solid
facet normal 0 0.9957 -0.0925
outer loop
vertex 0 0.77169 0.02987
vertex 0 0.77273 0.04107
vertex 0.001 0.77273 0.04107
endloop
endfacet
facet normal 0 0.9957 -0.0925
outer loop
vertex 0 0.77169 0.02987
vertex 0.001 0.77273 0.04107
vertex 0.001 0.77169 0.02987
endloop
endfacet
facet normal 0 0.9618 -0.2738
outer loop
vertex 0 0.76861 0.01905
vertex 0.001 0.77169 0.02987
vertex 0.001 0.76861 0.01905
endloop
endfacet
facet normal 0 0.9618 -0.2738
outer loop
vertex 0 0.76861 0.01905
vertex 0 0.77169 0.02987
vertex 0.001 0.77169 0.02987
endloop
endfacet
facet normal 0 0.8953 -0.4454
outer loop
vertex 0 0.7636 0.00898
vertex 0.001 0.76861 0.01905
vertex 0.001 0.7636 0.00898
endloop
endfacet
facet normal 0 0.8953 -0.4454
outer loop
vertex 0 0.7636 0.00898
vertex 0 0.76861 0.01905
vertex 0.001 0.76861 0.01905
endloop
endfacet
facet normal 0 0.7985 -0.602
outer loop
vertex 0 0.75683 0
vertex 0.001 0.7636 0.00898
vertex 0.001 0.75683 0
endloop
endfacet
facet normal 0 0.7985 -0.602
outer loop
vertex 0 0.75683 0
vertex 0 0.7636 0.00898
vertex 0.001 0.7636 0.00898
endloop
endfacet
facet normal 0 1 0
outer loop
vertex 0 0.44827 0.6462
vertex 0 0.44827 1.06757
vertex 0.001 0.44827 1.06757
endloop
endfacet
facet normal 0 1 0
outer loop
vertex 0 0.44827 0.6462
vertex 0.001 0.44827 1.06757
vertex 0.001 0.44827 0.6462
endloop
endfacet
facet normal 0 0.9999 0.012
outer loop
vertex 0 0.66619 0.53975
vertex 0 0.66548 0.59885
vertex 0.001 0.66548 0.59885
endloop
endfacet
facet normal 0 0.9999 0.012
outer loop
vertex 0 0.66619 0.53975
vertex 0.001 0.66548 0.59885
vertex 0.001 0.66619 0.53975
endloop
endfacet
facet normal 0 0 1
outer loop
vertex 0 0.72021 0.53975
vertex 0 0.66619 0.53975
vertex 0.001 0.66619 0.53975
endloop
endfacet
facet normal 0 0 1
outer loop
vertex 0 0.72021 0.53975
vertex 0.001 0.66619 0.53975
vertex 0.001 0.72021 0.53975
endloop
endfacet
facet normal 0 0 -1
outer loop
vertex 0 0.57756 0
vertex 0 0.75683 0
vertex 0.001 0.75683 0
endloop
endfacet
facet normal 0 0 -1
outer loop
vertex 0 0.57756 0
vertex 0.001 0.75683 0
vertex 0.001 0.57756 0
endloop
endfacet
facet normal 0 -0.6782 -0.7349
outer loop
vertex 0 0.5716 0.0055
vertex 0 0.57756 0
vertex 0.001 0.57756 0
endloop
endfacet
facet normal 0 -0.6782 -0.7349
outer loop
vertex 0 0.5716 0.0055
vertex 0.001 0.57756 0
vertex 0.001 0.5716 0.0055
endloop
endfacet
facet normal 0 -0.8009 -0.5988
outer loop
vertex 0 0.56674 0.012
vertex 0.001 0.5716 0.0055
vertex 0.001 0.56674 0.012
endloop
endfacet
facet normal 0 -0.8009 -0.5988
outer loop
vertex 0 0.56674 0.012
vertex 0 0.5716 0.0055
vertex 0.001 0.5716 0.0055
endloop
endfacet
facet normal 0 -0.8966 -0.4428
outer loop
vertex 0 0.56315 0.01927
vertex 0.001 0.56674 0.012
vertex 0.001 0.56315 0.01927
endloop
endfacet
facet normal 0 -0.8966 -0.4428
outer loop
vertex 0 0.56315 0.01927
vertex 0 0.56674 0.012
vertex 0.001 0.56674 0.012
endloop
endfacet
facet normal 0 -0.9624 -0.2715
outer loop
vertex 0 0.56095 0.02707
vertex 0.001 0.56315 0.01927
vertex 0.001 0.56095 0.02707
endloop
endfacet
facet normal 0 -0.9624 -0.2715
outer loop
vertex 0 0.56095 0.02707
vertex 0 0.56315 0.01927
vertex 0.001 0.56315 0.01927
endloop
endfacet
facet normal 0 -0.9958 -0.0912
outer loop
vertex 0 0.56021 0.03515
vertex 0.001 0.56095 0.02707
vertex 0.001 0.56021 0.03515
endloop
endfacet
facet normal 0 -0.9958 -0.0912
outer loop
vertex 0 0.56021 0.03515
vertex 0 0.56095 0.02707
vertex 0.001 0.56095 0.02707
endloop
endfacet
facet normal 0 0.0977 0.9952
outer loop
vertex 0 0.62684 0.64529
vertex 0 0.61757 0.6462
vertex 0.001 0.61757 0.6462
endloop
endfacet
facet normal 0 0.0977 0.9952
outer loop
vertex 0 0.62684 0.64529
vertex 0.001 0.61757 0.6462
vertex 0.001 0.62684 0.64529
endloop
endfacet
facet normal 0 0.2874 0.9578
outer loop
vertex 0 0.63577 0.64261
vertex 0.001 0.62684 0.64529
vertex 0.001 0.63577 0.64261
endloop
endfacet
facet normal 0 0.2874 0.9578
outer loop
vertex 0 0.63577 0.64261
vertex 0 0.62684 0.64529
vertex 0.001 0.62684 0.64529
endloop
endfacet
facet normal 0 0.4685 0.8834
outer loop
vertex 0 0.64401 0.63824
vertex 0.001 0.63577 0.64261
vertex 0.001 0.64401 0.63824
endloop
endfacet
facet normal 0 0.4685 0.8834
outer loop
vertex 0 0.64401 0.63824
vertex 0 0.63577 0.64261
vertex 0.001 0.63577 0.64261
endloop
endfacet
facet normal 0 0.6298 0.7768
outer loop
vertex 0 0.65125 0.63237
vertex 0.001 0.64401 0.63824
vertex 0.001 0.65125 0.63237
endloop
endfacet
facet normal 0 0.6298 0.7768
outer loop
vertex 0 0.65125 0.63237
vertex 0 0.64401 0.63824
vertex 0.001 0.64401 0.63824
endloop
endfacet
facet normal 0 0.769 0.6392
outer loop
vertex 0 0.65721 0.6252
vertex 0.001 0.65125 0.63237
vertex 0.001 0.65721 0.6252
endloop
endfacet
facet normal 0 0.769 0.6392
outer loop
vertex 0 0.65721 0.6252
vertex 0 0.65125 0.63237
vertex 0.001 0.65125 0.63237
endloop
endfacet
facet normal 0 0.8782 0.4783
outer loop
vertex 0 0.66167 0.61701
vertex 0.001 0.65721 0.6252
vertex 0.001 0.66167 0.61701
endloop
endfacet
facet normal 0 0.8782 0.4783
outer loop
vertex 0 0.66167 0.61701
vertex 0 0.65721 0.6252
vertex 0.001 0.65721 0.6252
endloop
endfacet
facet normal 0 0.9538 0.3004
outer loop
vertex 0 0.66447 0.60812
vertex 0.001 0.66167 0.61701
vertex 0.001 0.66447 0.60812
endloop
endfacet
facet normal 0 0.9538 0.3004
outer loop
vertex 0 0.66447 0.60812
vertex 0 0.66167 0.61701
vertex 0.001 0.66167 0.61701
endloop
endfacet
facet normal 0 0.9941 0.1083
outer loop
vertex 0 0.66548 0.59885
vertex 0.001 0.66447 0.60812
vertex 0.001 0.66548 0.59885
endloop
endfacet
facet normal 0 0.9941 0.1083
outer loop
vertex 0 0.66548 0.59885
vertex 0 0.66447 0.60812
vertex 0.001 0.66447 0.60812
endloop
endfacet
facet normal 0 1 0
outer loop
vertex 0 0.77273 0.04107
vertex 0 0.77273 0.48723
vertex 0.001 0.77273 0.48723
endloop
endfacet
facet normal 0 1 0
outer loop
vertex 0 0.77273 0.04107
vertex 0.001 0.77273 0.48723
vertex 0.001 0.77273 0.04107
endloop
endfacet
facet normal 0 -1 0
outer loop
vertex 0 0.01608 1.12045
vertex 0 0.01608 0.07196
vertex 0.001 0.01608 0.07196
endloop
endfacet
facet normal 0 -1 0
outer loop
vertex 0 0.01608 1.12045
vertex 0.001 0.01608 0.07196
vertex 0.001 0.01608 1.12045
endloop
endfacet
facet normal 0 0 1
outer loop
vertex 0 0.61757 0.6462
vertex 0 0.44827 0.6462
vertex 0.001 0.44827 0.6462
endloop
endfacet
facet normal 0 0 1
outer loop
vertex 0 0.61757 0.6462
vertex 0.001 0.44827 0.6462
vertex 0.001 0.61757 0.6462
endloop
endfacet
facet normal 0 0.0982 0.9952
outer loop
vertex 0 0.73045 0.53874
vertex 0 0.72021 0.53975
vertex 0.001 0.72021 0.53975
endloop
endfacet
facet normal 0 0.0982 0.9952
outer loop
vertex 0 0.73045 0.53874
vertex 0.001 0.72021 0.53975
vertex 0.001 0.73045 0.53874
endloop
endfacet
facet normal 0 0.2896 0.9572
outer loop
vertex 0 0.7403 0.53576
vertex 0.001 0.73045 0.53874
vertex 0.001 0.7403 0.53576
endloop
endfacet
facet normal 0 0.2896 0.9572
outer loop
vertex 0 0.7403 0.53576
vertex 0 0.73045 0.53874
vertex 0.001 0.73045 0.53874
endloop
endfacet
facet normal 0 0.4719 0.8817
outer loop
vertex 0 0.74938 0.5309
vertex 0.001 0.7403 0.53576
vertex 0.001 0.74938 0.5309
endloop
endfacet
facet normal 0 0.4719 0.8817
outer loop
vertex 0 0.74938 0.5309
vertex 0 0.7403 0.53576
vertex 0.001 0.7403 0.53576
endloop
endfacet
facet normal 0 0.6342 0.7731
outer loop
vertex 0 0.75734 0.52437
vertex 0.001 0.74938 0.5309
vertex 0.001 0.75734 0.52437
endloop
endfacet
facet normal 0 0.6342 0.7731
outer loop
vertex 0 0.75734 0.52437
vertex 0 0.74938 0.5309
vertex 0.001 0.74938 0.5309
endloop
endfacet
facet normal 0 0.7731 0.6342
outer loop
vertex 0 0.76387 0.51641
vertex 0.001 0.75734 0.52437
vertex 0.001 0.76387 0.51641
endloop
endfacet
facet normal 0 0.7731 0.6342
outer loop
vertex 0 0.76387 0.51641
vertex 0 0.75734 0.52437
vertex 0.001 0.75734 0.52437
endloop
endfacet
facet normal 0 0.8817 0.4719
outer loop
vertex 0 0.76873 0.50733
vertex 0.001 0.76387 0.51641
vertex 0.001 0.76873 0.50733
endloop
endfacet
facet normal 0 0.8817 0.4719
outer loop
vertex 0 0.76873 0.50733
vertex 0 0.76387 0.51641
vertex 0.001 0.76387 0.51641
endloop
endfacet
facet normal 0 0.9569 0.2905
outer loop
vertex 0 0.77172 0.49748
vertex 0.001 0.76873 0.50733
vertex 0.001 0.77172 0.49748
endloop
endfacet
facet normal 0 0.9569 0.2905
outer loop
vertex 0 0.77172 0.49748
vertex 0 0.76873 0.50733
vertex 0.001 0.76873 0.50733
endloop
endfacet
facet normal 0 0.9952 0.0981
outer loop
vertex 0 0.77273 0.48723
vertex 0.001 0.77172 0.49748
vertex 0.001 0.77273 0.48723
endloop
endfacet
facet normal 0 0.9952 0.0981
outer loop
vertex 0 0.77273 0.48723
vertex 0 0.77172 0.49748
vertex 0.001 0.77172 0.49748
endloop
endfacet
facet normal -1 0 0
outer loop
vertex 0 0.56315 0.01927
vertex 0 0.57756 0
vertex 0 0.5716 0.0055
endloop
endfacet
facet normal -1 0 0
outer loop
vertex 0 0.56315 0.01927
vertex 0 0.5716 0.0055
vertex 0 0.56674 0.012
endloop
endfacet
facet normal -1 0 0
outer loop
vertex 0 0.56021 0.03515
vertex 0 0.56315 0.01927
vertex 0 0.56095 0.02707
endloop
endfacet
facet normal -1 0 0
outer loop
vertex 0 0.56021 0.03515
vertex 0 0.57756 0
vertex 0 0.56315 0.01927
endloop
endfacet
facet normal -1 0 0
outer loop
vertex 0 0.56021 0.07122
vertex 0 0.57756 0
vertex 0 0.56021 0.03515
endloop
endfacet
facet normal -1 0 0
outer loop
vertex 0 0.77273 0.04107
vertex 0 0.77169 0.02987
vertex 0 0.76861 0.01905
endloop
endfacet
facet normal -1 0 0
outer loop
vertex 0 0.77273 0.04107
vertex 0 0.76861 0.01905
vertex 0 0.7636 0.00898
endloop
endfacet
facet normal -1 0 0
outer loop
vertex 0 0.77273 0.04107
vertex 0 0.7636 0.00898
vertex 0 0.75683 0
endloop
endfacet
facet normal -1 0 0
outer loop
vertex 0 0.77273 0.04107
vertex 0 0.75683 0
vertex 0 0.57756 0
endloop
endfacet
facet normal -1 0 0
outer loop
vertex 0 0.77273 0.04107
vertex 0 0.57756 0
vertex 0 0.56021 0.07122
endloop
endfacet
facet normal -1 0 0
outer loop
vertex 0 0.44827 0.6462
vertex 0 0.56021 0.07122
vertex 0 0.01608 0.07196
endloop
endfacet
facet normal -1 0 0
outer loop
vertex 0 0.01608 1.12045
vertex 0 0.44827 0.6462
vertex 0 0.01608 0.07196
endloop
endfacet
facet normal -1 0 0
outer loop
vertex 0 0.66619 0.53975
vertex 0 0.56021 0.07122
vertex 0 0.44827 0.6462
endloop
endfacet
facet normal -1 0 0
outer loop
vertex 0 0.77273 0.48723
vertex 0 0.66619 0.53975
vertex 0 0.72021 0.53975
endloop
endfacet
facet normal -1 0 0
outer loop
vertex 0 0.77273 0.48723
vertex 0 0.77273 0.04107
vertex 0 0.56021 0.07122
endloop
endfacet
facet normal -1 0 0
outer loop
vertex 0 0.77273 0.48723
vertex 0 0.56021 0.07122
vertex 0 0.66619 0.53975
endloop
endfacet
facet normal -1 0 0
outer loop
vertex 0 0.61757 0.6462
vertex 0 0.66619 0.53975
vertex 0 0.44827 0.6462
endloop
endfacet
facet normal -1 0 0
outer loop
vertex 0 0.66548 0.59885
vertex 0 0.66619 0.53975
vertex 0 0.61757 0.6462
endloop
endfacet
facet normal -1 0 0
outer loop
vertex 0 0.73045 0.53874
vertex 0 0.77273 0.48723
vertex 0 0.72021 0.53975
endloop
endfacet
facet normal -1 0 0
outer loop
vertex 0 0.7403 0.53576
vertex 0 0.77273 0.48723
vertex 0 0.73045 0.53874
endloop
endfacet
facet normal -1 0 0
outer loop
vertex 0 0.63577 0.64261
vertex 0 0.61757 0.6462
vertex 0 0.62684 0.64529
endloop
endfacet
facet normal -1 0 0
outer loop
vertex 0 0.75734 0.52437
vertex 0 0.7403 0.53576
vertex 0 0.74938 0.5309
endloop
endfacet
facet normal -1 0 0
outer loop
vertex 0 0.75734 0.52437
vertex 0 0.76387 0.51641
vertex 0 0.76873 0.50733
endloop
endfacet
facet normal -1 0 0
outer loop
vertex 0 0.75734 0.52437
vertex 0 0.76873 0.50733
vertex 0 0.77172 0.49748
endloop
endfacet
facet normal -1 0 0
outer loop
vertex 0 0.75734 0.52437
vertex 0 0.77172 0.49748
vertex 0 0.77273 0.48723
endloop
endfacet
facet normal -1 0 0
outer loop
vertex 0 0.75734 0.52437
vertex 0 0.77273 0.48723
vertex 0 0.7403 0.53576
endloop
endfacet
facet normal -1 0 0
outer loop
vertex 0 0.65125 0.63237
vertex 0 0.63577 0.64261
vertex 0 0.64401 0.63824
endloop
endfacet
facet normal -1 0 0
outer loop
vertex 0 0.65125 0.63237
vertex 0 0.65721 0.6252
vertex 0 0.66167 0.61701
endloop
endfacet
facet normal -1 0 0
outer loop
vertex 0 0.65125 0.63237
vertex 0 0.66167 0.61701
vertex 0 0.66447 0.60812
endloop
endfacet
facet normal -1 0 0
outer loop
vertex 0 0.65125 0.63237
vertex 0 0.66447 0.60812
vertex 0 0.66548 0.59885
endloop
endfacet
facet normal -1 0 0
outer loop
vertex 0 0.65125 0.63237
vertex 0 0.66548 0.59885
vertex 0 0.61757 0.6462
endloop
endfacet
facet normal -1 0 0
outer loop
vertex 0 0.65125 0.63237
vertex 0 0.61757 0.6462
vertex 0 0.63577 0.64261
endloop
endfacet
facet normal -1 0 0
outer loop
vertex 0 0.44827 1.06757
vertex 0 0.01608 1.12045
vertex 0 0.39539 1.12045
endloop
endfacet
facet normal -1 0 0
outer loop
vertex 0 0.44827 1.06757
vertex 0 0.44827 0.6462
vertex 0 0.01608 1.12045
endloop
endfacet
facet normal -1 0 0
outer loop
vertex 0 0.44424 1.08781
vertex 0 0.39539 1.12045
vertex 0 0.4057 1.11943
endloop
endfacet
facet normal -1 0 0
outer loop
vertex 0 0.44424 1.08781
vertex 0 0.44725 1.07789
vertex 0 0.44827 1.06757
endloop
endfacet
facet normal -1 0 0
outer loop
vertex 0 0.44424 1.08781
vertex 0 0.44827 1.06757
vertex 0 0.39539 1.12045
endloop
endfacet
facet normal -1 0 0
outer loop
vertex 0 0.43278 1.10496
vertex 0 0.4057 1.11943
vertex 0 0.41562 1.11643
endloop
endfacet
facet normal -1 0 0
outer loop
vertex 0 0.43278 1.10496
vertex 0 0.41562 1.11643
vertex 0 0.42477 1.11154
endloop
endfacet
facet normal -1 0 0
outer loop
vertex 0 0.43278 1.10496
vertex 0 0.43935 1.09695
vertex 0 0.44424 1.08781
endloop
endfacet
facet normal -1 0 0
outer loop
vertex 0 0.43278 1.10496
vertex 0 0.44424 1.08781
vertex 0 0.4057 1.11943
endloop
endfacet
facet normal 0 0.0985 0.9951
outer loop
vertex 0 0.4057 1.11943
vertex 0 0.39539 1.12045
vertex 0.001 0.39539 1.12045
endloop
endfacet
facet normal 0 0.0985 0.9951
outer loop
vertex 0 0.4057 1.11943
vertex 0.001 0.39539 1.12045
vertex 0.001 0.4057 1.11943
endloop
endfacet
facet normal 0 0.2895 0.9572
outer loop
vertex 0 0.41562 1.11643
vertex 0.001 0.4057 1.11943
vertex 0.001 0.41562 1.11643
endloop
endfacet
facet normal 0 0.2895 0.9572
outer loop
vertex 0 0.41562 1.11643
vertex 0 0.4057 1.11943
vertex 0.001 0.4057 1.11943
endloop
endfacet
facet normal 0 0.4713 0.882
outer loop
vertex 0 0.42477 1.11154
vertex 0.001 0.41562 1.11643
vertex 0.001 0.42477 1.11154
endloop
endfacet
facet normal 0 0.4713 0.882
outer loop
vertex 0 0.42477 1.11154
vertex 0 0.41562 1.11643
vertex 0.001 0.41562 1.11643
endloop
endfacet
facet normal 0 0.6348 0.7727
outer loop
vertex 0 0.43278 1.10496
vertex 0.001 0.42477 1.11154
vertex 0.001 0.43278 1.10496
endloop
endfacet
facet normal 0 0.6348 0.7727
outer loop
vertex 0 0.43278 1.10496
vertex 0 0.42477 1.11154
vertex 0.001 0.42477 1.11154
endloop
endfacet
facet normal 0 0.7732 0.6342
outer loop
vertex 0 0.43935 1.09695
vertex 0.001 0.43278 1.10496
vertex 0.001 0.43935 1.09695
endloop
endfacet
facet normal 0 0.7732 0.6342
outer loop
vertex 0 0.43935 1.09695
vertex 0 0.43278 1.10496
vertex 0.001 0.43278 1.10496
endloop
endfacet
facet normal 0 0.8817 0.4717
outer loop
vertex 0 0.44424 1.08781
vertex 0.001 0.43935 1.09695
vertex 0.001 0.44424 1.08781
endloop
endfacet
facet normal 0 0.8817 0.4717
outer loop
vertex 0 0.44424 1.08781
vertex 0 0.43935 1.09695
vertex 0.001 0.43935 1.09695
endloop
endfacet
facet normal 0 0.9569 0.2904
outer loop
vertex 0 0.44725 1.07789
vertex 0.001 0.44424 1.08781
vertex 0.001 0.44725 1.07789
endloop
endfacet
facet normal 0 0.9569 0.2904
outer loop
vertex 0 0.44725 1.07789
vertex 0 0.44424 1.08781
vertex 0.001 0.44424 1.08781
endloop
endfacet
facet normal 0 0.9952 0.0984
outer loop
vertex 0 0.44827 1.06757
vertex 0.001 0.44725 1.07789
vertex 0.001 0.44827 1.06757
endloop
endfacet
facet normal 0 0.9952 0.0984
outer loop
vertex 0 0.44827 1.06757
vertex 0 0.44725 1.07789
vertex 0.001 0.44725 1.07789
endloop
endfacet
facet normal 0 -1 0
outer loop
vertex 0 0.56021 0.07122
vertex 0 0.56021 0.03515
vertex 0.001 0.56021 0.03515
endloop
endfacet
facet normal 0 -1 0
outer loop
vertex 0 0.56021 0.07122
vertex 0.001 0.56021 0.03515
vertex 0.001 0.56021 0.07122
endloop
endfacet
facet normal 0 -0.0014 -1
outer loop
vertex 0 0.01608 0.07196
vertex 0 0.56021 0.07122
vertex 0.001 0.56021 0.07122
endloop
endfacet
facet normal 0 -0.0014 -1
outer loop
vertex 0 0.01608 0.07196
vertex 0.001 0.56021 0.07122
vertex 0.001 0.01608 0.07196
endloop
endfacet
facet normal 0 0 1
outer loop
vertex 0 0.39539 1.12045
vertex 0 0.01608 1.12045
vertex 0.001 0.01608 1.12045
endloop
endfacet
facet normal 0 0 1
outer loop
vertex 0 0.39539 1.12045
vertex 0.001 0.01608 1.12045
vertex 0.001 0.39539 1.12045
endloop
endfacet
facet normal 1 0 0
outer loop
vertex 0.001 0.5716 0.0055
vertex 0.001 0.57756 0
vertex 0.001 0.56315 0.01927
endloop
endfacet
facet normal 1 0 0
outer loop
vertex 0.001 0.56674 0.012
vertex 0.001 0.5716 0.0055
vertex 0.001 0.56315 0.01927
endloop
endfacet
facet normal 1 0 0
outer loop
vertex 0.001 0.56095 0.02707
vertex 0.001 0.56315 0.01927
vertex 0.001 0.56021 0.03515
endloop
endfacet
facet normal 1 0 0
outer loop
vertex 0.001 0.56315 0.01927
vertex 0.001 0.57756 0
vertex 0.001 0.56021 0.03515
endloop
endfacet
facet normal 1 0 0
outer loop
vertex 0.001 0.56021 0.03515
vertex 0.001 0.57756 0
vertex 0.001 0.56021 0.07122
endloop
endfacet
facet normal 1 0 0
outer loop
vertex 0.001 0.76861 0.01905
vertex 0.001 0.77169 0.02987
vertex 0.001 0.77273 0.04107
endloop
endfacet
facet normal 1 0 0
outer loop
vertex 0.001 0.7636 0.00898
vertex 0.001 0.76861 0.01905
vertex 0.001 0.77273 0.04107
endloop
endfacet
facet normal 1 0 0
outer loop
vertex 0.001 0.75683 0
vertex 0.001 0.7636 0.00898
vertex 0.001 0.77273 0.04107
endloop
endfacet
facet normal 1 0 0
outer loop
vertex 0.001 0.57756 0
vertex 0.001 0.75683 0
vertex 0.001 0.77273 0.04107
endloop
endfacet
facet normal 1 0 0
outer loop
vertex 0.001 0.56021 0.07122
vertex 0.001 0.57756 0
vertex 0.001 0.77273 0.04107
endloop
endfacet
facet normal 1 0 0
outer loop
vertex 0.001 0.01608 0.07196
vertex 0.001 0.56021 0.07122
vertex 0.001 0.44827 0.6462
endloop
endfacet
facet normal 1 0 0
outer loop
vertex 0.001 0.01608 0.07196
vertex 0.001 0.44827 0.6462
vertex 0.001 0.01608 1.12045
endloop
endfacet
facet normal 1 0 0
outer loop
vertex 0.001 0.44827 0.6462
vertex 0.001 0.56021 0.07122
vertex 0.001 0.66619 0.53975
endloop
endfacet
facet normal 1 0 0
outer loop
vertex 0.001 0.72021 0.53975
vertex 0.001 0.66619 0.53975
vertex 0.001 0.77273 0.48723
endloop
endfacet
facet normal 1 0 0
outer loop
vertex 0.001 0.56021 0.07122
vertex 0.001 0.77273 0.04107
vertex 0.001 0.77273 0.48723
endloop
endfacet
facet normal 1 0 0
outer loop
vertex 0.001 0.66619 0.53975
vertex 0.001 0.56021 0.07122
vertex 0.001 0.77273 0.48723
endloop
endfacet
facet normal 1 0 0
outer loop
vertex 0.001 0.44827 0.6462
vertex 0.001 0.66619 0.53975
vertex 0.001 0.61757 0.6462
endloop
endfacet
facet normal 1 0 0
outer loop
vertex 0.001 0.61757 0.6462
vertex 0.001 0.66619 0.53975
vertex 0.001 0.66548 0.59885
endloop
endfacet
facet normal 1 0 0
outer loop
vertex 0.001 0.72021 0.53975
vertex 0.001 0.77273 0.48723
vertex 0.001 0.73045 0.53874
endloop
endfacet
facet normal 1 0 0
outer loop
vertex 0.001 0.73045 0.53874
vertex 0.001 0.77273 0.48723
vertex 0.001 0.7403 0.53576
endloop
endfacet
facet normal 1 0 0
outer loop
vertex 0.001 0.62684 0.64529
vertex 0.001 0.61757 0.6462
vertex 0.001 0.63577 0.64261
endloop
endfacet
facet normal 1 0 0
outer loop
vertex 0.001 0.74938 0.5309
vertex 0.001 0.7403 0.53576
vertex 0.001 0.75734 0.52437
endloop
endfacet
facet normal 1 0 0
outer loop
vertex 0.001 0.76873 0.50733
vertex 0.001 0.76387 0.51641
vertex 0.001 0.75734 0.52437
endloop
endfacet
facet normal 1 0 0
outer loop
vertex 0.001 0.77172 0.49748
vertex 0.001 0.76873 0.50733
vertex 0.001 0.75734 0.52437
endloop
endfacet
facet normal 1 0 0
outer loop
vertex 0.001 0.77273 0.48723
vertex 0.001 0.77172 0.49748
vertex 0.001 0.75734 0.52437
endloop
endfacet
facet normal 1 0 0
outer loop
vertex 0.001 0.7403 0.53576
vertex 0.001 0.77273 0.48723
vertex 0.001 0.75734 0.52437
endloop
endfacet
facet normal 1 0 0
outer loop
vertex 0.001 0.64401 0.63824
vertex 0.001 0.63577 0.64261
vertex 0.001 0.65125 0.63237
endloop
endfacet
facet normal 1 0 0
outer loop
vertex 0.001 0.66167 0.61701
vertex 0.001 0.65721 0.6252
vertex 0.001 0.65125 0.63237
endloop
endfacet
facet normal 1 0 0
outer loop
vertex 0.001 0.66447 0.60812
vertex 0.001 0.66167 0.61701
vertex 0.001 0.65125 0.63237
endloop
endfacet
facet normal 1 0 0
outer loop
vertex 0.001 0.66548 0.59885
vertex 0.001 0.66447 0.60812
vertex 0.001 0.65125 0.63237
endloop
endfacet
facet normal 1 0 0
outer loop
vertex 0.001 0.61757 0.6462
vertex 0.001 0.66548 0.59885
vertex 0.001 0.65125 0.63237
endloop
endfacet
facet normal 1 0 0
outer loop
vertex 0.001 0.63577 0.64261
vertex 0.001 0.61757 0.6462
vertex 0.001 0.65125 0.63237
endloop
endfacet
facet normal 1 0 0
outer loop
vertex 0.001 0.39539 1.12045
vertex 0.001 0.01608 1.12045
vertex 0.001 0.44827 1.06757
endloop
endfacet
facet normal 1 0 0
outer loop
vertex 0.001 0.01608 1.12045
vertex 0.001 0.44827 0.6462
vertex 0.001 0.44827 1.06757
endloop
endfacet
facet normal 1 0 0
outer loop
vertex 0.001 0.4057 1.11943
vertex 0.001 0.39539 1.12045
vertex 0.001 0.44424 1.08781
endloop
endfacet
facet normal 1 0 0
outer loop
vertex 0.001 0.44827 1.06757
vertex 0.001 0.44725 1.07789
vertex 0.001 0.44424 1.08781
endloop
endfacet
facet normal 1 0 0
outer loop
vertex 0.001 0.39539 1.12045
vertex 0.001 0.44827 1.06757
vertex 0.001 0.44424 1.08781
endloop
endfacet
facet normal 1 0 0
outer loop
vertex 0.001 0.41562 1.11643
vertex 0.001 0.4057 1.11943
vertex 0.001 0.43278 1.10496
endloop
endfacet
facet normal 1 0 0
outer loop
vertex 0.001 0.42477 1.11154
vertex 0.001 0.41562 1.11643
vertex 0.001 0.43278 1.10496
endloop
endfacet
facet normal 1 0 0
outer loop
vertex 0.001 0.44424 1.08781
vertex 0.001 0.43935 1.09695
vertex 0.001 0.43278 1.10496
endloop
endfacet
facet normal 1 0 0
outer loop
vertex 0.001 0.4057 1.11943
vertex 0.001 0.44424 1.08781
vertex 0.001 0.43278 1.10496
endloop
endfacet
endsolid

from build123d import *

# Parameters (mm, degrees)
ESTRUSIONE_ESTRUSIONE1_DEPTH = 0.001


with BuildPart() as part:
    # Schizzo1 → Estrusione-Estrusione1 (new body)
    with BuildSketch(Plane(origin=(0, 0, 0), x_dir=(0, 0, -1), z_dir=(1, 0, 0))):
        with BuildLine():
            Line((-1.120450557, 0.016083045), (-1.120450557, 0.395388309))
            ThreePointArc((-1.120450557, 0.395388309), (-1.104963, 0.43277858), (-1.067572729, 0.448266137))
            Line((-1.067572729, 0.448266137), (-0.646200691, 0.448266137))
            Line((-0.646200691, 0.448266137), (-0.646200691, 0.61756545))
            ThreePointArc((-0.646200691, 0.61756545), (-0.632365719, 0.651249323), (-0.598848989, 0.665484439))
            Line((-0.598848989, 0.665484439), (-0.539752847, 0.666188238))
            Line((-0.539752847, 0.666188238), (-0.539752847, 0.720206582))
            ThreePointArc((-0.539752847, 0.720206582), (-0.524370528, 0.757342786), (-0.487234324, 0.772725105))
            Line((-0.487234324, 0.772725105), (-0.041067153, 0.772725105))
            ThreePointArc((-0.041067153, 0.772725105), (-0.019048902, 0.768612289), (0, 0.756828487))
            Line((0, 0.756828487), (0, 0.577556624))
            ThreePointArc((0, 0.577556624), (-0.015549033, 0.564779444), (-0.035147663, 0.56020534))
            Line((-0.035147663, 0.56020534), (-0.071222104, 0.56020534))
            Line((-0.071222104, 0.56020534), (-0.071962073, 0.016083045))
            Line((-0.071962073, 0.016083045), (-1.120450557, 0.016083045))
        make_face()
    extrude(amount=ESTRUSIONE_ESTRUSIONE1_DEPTH)


solid = part.part
